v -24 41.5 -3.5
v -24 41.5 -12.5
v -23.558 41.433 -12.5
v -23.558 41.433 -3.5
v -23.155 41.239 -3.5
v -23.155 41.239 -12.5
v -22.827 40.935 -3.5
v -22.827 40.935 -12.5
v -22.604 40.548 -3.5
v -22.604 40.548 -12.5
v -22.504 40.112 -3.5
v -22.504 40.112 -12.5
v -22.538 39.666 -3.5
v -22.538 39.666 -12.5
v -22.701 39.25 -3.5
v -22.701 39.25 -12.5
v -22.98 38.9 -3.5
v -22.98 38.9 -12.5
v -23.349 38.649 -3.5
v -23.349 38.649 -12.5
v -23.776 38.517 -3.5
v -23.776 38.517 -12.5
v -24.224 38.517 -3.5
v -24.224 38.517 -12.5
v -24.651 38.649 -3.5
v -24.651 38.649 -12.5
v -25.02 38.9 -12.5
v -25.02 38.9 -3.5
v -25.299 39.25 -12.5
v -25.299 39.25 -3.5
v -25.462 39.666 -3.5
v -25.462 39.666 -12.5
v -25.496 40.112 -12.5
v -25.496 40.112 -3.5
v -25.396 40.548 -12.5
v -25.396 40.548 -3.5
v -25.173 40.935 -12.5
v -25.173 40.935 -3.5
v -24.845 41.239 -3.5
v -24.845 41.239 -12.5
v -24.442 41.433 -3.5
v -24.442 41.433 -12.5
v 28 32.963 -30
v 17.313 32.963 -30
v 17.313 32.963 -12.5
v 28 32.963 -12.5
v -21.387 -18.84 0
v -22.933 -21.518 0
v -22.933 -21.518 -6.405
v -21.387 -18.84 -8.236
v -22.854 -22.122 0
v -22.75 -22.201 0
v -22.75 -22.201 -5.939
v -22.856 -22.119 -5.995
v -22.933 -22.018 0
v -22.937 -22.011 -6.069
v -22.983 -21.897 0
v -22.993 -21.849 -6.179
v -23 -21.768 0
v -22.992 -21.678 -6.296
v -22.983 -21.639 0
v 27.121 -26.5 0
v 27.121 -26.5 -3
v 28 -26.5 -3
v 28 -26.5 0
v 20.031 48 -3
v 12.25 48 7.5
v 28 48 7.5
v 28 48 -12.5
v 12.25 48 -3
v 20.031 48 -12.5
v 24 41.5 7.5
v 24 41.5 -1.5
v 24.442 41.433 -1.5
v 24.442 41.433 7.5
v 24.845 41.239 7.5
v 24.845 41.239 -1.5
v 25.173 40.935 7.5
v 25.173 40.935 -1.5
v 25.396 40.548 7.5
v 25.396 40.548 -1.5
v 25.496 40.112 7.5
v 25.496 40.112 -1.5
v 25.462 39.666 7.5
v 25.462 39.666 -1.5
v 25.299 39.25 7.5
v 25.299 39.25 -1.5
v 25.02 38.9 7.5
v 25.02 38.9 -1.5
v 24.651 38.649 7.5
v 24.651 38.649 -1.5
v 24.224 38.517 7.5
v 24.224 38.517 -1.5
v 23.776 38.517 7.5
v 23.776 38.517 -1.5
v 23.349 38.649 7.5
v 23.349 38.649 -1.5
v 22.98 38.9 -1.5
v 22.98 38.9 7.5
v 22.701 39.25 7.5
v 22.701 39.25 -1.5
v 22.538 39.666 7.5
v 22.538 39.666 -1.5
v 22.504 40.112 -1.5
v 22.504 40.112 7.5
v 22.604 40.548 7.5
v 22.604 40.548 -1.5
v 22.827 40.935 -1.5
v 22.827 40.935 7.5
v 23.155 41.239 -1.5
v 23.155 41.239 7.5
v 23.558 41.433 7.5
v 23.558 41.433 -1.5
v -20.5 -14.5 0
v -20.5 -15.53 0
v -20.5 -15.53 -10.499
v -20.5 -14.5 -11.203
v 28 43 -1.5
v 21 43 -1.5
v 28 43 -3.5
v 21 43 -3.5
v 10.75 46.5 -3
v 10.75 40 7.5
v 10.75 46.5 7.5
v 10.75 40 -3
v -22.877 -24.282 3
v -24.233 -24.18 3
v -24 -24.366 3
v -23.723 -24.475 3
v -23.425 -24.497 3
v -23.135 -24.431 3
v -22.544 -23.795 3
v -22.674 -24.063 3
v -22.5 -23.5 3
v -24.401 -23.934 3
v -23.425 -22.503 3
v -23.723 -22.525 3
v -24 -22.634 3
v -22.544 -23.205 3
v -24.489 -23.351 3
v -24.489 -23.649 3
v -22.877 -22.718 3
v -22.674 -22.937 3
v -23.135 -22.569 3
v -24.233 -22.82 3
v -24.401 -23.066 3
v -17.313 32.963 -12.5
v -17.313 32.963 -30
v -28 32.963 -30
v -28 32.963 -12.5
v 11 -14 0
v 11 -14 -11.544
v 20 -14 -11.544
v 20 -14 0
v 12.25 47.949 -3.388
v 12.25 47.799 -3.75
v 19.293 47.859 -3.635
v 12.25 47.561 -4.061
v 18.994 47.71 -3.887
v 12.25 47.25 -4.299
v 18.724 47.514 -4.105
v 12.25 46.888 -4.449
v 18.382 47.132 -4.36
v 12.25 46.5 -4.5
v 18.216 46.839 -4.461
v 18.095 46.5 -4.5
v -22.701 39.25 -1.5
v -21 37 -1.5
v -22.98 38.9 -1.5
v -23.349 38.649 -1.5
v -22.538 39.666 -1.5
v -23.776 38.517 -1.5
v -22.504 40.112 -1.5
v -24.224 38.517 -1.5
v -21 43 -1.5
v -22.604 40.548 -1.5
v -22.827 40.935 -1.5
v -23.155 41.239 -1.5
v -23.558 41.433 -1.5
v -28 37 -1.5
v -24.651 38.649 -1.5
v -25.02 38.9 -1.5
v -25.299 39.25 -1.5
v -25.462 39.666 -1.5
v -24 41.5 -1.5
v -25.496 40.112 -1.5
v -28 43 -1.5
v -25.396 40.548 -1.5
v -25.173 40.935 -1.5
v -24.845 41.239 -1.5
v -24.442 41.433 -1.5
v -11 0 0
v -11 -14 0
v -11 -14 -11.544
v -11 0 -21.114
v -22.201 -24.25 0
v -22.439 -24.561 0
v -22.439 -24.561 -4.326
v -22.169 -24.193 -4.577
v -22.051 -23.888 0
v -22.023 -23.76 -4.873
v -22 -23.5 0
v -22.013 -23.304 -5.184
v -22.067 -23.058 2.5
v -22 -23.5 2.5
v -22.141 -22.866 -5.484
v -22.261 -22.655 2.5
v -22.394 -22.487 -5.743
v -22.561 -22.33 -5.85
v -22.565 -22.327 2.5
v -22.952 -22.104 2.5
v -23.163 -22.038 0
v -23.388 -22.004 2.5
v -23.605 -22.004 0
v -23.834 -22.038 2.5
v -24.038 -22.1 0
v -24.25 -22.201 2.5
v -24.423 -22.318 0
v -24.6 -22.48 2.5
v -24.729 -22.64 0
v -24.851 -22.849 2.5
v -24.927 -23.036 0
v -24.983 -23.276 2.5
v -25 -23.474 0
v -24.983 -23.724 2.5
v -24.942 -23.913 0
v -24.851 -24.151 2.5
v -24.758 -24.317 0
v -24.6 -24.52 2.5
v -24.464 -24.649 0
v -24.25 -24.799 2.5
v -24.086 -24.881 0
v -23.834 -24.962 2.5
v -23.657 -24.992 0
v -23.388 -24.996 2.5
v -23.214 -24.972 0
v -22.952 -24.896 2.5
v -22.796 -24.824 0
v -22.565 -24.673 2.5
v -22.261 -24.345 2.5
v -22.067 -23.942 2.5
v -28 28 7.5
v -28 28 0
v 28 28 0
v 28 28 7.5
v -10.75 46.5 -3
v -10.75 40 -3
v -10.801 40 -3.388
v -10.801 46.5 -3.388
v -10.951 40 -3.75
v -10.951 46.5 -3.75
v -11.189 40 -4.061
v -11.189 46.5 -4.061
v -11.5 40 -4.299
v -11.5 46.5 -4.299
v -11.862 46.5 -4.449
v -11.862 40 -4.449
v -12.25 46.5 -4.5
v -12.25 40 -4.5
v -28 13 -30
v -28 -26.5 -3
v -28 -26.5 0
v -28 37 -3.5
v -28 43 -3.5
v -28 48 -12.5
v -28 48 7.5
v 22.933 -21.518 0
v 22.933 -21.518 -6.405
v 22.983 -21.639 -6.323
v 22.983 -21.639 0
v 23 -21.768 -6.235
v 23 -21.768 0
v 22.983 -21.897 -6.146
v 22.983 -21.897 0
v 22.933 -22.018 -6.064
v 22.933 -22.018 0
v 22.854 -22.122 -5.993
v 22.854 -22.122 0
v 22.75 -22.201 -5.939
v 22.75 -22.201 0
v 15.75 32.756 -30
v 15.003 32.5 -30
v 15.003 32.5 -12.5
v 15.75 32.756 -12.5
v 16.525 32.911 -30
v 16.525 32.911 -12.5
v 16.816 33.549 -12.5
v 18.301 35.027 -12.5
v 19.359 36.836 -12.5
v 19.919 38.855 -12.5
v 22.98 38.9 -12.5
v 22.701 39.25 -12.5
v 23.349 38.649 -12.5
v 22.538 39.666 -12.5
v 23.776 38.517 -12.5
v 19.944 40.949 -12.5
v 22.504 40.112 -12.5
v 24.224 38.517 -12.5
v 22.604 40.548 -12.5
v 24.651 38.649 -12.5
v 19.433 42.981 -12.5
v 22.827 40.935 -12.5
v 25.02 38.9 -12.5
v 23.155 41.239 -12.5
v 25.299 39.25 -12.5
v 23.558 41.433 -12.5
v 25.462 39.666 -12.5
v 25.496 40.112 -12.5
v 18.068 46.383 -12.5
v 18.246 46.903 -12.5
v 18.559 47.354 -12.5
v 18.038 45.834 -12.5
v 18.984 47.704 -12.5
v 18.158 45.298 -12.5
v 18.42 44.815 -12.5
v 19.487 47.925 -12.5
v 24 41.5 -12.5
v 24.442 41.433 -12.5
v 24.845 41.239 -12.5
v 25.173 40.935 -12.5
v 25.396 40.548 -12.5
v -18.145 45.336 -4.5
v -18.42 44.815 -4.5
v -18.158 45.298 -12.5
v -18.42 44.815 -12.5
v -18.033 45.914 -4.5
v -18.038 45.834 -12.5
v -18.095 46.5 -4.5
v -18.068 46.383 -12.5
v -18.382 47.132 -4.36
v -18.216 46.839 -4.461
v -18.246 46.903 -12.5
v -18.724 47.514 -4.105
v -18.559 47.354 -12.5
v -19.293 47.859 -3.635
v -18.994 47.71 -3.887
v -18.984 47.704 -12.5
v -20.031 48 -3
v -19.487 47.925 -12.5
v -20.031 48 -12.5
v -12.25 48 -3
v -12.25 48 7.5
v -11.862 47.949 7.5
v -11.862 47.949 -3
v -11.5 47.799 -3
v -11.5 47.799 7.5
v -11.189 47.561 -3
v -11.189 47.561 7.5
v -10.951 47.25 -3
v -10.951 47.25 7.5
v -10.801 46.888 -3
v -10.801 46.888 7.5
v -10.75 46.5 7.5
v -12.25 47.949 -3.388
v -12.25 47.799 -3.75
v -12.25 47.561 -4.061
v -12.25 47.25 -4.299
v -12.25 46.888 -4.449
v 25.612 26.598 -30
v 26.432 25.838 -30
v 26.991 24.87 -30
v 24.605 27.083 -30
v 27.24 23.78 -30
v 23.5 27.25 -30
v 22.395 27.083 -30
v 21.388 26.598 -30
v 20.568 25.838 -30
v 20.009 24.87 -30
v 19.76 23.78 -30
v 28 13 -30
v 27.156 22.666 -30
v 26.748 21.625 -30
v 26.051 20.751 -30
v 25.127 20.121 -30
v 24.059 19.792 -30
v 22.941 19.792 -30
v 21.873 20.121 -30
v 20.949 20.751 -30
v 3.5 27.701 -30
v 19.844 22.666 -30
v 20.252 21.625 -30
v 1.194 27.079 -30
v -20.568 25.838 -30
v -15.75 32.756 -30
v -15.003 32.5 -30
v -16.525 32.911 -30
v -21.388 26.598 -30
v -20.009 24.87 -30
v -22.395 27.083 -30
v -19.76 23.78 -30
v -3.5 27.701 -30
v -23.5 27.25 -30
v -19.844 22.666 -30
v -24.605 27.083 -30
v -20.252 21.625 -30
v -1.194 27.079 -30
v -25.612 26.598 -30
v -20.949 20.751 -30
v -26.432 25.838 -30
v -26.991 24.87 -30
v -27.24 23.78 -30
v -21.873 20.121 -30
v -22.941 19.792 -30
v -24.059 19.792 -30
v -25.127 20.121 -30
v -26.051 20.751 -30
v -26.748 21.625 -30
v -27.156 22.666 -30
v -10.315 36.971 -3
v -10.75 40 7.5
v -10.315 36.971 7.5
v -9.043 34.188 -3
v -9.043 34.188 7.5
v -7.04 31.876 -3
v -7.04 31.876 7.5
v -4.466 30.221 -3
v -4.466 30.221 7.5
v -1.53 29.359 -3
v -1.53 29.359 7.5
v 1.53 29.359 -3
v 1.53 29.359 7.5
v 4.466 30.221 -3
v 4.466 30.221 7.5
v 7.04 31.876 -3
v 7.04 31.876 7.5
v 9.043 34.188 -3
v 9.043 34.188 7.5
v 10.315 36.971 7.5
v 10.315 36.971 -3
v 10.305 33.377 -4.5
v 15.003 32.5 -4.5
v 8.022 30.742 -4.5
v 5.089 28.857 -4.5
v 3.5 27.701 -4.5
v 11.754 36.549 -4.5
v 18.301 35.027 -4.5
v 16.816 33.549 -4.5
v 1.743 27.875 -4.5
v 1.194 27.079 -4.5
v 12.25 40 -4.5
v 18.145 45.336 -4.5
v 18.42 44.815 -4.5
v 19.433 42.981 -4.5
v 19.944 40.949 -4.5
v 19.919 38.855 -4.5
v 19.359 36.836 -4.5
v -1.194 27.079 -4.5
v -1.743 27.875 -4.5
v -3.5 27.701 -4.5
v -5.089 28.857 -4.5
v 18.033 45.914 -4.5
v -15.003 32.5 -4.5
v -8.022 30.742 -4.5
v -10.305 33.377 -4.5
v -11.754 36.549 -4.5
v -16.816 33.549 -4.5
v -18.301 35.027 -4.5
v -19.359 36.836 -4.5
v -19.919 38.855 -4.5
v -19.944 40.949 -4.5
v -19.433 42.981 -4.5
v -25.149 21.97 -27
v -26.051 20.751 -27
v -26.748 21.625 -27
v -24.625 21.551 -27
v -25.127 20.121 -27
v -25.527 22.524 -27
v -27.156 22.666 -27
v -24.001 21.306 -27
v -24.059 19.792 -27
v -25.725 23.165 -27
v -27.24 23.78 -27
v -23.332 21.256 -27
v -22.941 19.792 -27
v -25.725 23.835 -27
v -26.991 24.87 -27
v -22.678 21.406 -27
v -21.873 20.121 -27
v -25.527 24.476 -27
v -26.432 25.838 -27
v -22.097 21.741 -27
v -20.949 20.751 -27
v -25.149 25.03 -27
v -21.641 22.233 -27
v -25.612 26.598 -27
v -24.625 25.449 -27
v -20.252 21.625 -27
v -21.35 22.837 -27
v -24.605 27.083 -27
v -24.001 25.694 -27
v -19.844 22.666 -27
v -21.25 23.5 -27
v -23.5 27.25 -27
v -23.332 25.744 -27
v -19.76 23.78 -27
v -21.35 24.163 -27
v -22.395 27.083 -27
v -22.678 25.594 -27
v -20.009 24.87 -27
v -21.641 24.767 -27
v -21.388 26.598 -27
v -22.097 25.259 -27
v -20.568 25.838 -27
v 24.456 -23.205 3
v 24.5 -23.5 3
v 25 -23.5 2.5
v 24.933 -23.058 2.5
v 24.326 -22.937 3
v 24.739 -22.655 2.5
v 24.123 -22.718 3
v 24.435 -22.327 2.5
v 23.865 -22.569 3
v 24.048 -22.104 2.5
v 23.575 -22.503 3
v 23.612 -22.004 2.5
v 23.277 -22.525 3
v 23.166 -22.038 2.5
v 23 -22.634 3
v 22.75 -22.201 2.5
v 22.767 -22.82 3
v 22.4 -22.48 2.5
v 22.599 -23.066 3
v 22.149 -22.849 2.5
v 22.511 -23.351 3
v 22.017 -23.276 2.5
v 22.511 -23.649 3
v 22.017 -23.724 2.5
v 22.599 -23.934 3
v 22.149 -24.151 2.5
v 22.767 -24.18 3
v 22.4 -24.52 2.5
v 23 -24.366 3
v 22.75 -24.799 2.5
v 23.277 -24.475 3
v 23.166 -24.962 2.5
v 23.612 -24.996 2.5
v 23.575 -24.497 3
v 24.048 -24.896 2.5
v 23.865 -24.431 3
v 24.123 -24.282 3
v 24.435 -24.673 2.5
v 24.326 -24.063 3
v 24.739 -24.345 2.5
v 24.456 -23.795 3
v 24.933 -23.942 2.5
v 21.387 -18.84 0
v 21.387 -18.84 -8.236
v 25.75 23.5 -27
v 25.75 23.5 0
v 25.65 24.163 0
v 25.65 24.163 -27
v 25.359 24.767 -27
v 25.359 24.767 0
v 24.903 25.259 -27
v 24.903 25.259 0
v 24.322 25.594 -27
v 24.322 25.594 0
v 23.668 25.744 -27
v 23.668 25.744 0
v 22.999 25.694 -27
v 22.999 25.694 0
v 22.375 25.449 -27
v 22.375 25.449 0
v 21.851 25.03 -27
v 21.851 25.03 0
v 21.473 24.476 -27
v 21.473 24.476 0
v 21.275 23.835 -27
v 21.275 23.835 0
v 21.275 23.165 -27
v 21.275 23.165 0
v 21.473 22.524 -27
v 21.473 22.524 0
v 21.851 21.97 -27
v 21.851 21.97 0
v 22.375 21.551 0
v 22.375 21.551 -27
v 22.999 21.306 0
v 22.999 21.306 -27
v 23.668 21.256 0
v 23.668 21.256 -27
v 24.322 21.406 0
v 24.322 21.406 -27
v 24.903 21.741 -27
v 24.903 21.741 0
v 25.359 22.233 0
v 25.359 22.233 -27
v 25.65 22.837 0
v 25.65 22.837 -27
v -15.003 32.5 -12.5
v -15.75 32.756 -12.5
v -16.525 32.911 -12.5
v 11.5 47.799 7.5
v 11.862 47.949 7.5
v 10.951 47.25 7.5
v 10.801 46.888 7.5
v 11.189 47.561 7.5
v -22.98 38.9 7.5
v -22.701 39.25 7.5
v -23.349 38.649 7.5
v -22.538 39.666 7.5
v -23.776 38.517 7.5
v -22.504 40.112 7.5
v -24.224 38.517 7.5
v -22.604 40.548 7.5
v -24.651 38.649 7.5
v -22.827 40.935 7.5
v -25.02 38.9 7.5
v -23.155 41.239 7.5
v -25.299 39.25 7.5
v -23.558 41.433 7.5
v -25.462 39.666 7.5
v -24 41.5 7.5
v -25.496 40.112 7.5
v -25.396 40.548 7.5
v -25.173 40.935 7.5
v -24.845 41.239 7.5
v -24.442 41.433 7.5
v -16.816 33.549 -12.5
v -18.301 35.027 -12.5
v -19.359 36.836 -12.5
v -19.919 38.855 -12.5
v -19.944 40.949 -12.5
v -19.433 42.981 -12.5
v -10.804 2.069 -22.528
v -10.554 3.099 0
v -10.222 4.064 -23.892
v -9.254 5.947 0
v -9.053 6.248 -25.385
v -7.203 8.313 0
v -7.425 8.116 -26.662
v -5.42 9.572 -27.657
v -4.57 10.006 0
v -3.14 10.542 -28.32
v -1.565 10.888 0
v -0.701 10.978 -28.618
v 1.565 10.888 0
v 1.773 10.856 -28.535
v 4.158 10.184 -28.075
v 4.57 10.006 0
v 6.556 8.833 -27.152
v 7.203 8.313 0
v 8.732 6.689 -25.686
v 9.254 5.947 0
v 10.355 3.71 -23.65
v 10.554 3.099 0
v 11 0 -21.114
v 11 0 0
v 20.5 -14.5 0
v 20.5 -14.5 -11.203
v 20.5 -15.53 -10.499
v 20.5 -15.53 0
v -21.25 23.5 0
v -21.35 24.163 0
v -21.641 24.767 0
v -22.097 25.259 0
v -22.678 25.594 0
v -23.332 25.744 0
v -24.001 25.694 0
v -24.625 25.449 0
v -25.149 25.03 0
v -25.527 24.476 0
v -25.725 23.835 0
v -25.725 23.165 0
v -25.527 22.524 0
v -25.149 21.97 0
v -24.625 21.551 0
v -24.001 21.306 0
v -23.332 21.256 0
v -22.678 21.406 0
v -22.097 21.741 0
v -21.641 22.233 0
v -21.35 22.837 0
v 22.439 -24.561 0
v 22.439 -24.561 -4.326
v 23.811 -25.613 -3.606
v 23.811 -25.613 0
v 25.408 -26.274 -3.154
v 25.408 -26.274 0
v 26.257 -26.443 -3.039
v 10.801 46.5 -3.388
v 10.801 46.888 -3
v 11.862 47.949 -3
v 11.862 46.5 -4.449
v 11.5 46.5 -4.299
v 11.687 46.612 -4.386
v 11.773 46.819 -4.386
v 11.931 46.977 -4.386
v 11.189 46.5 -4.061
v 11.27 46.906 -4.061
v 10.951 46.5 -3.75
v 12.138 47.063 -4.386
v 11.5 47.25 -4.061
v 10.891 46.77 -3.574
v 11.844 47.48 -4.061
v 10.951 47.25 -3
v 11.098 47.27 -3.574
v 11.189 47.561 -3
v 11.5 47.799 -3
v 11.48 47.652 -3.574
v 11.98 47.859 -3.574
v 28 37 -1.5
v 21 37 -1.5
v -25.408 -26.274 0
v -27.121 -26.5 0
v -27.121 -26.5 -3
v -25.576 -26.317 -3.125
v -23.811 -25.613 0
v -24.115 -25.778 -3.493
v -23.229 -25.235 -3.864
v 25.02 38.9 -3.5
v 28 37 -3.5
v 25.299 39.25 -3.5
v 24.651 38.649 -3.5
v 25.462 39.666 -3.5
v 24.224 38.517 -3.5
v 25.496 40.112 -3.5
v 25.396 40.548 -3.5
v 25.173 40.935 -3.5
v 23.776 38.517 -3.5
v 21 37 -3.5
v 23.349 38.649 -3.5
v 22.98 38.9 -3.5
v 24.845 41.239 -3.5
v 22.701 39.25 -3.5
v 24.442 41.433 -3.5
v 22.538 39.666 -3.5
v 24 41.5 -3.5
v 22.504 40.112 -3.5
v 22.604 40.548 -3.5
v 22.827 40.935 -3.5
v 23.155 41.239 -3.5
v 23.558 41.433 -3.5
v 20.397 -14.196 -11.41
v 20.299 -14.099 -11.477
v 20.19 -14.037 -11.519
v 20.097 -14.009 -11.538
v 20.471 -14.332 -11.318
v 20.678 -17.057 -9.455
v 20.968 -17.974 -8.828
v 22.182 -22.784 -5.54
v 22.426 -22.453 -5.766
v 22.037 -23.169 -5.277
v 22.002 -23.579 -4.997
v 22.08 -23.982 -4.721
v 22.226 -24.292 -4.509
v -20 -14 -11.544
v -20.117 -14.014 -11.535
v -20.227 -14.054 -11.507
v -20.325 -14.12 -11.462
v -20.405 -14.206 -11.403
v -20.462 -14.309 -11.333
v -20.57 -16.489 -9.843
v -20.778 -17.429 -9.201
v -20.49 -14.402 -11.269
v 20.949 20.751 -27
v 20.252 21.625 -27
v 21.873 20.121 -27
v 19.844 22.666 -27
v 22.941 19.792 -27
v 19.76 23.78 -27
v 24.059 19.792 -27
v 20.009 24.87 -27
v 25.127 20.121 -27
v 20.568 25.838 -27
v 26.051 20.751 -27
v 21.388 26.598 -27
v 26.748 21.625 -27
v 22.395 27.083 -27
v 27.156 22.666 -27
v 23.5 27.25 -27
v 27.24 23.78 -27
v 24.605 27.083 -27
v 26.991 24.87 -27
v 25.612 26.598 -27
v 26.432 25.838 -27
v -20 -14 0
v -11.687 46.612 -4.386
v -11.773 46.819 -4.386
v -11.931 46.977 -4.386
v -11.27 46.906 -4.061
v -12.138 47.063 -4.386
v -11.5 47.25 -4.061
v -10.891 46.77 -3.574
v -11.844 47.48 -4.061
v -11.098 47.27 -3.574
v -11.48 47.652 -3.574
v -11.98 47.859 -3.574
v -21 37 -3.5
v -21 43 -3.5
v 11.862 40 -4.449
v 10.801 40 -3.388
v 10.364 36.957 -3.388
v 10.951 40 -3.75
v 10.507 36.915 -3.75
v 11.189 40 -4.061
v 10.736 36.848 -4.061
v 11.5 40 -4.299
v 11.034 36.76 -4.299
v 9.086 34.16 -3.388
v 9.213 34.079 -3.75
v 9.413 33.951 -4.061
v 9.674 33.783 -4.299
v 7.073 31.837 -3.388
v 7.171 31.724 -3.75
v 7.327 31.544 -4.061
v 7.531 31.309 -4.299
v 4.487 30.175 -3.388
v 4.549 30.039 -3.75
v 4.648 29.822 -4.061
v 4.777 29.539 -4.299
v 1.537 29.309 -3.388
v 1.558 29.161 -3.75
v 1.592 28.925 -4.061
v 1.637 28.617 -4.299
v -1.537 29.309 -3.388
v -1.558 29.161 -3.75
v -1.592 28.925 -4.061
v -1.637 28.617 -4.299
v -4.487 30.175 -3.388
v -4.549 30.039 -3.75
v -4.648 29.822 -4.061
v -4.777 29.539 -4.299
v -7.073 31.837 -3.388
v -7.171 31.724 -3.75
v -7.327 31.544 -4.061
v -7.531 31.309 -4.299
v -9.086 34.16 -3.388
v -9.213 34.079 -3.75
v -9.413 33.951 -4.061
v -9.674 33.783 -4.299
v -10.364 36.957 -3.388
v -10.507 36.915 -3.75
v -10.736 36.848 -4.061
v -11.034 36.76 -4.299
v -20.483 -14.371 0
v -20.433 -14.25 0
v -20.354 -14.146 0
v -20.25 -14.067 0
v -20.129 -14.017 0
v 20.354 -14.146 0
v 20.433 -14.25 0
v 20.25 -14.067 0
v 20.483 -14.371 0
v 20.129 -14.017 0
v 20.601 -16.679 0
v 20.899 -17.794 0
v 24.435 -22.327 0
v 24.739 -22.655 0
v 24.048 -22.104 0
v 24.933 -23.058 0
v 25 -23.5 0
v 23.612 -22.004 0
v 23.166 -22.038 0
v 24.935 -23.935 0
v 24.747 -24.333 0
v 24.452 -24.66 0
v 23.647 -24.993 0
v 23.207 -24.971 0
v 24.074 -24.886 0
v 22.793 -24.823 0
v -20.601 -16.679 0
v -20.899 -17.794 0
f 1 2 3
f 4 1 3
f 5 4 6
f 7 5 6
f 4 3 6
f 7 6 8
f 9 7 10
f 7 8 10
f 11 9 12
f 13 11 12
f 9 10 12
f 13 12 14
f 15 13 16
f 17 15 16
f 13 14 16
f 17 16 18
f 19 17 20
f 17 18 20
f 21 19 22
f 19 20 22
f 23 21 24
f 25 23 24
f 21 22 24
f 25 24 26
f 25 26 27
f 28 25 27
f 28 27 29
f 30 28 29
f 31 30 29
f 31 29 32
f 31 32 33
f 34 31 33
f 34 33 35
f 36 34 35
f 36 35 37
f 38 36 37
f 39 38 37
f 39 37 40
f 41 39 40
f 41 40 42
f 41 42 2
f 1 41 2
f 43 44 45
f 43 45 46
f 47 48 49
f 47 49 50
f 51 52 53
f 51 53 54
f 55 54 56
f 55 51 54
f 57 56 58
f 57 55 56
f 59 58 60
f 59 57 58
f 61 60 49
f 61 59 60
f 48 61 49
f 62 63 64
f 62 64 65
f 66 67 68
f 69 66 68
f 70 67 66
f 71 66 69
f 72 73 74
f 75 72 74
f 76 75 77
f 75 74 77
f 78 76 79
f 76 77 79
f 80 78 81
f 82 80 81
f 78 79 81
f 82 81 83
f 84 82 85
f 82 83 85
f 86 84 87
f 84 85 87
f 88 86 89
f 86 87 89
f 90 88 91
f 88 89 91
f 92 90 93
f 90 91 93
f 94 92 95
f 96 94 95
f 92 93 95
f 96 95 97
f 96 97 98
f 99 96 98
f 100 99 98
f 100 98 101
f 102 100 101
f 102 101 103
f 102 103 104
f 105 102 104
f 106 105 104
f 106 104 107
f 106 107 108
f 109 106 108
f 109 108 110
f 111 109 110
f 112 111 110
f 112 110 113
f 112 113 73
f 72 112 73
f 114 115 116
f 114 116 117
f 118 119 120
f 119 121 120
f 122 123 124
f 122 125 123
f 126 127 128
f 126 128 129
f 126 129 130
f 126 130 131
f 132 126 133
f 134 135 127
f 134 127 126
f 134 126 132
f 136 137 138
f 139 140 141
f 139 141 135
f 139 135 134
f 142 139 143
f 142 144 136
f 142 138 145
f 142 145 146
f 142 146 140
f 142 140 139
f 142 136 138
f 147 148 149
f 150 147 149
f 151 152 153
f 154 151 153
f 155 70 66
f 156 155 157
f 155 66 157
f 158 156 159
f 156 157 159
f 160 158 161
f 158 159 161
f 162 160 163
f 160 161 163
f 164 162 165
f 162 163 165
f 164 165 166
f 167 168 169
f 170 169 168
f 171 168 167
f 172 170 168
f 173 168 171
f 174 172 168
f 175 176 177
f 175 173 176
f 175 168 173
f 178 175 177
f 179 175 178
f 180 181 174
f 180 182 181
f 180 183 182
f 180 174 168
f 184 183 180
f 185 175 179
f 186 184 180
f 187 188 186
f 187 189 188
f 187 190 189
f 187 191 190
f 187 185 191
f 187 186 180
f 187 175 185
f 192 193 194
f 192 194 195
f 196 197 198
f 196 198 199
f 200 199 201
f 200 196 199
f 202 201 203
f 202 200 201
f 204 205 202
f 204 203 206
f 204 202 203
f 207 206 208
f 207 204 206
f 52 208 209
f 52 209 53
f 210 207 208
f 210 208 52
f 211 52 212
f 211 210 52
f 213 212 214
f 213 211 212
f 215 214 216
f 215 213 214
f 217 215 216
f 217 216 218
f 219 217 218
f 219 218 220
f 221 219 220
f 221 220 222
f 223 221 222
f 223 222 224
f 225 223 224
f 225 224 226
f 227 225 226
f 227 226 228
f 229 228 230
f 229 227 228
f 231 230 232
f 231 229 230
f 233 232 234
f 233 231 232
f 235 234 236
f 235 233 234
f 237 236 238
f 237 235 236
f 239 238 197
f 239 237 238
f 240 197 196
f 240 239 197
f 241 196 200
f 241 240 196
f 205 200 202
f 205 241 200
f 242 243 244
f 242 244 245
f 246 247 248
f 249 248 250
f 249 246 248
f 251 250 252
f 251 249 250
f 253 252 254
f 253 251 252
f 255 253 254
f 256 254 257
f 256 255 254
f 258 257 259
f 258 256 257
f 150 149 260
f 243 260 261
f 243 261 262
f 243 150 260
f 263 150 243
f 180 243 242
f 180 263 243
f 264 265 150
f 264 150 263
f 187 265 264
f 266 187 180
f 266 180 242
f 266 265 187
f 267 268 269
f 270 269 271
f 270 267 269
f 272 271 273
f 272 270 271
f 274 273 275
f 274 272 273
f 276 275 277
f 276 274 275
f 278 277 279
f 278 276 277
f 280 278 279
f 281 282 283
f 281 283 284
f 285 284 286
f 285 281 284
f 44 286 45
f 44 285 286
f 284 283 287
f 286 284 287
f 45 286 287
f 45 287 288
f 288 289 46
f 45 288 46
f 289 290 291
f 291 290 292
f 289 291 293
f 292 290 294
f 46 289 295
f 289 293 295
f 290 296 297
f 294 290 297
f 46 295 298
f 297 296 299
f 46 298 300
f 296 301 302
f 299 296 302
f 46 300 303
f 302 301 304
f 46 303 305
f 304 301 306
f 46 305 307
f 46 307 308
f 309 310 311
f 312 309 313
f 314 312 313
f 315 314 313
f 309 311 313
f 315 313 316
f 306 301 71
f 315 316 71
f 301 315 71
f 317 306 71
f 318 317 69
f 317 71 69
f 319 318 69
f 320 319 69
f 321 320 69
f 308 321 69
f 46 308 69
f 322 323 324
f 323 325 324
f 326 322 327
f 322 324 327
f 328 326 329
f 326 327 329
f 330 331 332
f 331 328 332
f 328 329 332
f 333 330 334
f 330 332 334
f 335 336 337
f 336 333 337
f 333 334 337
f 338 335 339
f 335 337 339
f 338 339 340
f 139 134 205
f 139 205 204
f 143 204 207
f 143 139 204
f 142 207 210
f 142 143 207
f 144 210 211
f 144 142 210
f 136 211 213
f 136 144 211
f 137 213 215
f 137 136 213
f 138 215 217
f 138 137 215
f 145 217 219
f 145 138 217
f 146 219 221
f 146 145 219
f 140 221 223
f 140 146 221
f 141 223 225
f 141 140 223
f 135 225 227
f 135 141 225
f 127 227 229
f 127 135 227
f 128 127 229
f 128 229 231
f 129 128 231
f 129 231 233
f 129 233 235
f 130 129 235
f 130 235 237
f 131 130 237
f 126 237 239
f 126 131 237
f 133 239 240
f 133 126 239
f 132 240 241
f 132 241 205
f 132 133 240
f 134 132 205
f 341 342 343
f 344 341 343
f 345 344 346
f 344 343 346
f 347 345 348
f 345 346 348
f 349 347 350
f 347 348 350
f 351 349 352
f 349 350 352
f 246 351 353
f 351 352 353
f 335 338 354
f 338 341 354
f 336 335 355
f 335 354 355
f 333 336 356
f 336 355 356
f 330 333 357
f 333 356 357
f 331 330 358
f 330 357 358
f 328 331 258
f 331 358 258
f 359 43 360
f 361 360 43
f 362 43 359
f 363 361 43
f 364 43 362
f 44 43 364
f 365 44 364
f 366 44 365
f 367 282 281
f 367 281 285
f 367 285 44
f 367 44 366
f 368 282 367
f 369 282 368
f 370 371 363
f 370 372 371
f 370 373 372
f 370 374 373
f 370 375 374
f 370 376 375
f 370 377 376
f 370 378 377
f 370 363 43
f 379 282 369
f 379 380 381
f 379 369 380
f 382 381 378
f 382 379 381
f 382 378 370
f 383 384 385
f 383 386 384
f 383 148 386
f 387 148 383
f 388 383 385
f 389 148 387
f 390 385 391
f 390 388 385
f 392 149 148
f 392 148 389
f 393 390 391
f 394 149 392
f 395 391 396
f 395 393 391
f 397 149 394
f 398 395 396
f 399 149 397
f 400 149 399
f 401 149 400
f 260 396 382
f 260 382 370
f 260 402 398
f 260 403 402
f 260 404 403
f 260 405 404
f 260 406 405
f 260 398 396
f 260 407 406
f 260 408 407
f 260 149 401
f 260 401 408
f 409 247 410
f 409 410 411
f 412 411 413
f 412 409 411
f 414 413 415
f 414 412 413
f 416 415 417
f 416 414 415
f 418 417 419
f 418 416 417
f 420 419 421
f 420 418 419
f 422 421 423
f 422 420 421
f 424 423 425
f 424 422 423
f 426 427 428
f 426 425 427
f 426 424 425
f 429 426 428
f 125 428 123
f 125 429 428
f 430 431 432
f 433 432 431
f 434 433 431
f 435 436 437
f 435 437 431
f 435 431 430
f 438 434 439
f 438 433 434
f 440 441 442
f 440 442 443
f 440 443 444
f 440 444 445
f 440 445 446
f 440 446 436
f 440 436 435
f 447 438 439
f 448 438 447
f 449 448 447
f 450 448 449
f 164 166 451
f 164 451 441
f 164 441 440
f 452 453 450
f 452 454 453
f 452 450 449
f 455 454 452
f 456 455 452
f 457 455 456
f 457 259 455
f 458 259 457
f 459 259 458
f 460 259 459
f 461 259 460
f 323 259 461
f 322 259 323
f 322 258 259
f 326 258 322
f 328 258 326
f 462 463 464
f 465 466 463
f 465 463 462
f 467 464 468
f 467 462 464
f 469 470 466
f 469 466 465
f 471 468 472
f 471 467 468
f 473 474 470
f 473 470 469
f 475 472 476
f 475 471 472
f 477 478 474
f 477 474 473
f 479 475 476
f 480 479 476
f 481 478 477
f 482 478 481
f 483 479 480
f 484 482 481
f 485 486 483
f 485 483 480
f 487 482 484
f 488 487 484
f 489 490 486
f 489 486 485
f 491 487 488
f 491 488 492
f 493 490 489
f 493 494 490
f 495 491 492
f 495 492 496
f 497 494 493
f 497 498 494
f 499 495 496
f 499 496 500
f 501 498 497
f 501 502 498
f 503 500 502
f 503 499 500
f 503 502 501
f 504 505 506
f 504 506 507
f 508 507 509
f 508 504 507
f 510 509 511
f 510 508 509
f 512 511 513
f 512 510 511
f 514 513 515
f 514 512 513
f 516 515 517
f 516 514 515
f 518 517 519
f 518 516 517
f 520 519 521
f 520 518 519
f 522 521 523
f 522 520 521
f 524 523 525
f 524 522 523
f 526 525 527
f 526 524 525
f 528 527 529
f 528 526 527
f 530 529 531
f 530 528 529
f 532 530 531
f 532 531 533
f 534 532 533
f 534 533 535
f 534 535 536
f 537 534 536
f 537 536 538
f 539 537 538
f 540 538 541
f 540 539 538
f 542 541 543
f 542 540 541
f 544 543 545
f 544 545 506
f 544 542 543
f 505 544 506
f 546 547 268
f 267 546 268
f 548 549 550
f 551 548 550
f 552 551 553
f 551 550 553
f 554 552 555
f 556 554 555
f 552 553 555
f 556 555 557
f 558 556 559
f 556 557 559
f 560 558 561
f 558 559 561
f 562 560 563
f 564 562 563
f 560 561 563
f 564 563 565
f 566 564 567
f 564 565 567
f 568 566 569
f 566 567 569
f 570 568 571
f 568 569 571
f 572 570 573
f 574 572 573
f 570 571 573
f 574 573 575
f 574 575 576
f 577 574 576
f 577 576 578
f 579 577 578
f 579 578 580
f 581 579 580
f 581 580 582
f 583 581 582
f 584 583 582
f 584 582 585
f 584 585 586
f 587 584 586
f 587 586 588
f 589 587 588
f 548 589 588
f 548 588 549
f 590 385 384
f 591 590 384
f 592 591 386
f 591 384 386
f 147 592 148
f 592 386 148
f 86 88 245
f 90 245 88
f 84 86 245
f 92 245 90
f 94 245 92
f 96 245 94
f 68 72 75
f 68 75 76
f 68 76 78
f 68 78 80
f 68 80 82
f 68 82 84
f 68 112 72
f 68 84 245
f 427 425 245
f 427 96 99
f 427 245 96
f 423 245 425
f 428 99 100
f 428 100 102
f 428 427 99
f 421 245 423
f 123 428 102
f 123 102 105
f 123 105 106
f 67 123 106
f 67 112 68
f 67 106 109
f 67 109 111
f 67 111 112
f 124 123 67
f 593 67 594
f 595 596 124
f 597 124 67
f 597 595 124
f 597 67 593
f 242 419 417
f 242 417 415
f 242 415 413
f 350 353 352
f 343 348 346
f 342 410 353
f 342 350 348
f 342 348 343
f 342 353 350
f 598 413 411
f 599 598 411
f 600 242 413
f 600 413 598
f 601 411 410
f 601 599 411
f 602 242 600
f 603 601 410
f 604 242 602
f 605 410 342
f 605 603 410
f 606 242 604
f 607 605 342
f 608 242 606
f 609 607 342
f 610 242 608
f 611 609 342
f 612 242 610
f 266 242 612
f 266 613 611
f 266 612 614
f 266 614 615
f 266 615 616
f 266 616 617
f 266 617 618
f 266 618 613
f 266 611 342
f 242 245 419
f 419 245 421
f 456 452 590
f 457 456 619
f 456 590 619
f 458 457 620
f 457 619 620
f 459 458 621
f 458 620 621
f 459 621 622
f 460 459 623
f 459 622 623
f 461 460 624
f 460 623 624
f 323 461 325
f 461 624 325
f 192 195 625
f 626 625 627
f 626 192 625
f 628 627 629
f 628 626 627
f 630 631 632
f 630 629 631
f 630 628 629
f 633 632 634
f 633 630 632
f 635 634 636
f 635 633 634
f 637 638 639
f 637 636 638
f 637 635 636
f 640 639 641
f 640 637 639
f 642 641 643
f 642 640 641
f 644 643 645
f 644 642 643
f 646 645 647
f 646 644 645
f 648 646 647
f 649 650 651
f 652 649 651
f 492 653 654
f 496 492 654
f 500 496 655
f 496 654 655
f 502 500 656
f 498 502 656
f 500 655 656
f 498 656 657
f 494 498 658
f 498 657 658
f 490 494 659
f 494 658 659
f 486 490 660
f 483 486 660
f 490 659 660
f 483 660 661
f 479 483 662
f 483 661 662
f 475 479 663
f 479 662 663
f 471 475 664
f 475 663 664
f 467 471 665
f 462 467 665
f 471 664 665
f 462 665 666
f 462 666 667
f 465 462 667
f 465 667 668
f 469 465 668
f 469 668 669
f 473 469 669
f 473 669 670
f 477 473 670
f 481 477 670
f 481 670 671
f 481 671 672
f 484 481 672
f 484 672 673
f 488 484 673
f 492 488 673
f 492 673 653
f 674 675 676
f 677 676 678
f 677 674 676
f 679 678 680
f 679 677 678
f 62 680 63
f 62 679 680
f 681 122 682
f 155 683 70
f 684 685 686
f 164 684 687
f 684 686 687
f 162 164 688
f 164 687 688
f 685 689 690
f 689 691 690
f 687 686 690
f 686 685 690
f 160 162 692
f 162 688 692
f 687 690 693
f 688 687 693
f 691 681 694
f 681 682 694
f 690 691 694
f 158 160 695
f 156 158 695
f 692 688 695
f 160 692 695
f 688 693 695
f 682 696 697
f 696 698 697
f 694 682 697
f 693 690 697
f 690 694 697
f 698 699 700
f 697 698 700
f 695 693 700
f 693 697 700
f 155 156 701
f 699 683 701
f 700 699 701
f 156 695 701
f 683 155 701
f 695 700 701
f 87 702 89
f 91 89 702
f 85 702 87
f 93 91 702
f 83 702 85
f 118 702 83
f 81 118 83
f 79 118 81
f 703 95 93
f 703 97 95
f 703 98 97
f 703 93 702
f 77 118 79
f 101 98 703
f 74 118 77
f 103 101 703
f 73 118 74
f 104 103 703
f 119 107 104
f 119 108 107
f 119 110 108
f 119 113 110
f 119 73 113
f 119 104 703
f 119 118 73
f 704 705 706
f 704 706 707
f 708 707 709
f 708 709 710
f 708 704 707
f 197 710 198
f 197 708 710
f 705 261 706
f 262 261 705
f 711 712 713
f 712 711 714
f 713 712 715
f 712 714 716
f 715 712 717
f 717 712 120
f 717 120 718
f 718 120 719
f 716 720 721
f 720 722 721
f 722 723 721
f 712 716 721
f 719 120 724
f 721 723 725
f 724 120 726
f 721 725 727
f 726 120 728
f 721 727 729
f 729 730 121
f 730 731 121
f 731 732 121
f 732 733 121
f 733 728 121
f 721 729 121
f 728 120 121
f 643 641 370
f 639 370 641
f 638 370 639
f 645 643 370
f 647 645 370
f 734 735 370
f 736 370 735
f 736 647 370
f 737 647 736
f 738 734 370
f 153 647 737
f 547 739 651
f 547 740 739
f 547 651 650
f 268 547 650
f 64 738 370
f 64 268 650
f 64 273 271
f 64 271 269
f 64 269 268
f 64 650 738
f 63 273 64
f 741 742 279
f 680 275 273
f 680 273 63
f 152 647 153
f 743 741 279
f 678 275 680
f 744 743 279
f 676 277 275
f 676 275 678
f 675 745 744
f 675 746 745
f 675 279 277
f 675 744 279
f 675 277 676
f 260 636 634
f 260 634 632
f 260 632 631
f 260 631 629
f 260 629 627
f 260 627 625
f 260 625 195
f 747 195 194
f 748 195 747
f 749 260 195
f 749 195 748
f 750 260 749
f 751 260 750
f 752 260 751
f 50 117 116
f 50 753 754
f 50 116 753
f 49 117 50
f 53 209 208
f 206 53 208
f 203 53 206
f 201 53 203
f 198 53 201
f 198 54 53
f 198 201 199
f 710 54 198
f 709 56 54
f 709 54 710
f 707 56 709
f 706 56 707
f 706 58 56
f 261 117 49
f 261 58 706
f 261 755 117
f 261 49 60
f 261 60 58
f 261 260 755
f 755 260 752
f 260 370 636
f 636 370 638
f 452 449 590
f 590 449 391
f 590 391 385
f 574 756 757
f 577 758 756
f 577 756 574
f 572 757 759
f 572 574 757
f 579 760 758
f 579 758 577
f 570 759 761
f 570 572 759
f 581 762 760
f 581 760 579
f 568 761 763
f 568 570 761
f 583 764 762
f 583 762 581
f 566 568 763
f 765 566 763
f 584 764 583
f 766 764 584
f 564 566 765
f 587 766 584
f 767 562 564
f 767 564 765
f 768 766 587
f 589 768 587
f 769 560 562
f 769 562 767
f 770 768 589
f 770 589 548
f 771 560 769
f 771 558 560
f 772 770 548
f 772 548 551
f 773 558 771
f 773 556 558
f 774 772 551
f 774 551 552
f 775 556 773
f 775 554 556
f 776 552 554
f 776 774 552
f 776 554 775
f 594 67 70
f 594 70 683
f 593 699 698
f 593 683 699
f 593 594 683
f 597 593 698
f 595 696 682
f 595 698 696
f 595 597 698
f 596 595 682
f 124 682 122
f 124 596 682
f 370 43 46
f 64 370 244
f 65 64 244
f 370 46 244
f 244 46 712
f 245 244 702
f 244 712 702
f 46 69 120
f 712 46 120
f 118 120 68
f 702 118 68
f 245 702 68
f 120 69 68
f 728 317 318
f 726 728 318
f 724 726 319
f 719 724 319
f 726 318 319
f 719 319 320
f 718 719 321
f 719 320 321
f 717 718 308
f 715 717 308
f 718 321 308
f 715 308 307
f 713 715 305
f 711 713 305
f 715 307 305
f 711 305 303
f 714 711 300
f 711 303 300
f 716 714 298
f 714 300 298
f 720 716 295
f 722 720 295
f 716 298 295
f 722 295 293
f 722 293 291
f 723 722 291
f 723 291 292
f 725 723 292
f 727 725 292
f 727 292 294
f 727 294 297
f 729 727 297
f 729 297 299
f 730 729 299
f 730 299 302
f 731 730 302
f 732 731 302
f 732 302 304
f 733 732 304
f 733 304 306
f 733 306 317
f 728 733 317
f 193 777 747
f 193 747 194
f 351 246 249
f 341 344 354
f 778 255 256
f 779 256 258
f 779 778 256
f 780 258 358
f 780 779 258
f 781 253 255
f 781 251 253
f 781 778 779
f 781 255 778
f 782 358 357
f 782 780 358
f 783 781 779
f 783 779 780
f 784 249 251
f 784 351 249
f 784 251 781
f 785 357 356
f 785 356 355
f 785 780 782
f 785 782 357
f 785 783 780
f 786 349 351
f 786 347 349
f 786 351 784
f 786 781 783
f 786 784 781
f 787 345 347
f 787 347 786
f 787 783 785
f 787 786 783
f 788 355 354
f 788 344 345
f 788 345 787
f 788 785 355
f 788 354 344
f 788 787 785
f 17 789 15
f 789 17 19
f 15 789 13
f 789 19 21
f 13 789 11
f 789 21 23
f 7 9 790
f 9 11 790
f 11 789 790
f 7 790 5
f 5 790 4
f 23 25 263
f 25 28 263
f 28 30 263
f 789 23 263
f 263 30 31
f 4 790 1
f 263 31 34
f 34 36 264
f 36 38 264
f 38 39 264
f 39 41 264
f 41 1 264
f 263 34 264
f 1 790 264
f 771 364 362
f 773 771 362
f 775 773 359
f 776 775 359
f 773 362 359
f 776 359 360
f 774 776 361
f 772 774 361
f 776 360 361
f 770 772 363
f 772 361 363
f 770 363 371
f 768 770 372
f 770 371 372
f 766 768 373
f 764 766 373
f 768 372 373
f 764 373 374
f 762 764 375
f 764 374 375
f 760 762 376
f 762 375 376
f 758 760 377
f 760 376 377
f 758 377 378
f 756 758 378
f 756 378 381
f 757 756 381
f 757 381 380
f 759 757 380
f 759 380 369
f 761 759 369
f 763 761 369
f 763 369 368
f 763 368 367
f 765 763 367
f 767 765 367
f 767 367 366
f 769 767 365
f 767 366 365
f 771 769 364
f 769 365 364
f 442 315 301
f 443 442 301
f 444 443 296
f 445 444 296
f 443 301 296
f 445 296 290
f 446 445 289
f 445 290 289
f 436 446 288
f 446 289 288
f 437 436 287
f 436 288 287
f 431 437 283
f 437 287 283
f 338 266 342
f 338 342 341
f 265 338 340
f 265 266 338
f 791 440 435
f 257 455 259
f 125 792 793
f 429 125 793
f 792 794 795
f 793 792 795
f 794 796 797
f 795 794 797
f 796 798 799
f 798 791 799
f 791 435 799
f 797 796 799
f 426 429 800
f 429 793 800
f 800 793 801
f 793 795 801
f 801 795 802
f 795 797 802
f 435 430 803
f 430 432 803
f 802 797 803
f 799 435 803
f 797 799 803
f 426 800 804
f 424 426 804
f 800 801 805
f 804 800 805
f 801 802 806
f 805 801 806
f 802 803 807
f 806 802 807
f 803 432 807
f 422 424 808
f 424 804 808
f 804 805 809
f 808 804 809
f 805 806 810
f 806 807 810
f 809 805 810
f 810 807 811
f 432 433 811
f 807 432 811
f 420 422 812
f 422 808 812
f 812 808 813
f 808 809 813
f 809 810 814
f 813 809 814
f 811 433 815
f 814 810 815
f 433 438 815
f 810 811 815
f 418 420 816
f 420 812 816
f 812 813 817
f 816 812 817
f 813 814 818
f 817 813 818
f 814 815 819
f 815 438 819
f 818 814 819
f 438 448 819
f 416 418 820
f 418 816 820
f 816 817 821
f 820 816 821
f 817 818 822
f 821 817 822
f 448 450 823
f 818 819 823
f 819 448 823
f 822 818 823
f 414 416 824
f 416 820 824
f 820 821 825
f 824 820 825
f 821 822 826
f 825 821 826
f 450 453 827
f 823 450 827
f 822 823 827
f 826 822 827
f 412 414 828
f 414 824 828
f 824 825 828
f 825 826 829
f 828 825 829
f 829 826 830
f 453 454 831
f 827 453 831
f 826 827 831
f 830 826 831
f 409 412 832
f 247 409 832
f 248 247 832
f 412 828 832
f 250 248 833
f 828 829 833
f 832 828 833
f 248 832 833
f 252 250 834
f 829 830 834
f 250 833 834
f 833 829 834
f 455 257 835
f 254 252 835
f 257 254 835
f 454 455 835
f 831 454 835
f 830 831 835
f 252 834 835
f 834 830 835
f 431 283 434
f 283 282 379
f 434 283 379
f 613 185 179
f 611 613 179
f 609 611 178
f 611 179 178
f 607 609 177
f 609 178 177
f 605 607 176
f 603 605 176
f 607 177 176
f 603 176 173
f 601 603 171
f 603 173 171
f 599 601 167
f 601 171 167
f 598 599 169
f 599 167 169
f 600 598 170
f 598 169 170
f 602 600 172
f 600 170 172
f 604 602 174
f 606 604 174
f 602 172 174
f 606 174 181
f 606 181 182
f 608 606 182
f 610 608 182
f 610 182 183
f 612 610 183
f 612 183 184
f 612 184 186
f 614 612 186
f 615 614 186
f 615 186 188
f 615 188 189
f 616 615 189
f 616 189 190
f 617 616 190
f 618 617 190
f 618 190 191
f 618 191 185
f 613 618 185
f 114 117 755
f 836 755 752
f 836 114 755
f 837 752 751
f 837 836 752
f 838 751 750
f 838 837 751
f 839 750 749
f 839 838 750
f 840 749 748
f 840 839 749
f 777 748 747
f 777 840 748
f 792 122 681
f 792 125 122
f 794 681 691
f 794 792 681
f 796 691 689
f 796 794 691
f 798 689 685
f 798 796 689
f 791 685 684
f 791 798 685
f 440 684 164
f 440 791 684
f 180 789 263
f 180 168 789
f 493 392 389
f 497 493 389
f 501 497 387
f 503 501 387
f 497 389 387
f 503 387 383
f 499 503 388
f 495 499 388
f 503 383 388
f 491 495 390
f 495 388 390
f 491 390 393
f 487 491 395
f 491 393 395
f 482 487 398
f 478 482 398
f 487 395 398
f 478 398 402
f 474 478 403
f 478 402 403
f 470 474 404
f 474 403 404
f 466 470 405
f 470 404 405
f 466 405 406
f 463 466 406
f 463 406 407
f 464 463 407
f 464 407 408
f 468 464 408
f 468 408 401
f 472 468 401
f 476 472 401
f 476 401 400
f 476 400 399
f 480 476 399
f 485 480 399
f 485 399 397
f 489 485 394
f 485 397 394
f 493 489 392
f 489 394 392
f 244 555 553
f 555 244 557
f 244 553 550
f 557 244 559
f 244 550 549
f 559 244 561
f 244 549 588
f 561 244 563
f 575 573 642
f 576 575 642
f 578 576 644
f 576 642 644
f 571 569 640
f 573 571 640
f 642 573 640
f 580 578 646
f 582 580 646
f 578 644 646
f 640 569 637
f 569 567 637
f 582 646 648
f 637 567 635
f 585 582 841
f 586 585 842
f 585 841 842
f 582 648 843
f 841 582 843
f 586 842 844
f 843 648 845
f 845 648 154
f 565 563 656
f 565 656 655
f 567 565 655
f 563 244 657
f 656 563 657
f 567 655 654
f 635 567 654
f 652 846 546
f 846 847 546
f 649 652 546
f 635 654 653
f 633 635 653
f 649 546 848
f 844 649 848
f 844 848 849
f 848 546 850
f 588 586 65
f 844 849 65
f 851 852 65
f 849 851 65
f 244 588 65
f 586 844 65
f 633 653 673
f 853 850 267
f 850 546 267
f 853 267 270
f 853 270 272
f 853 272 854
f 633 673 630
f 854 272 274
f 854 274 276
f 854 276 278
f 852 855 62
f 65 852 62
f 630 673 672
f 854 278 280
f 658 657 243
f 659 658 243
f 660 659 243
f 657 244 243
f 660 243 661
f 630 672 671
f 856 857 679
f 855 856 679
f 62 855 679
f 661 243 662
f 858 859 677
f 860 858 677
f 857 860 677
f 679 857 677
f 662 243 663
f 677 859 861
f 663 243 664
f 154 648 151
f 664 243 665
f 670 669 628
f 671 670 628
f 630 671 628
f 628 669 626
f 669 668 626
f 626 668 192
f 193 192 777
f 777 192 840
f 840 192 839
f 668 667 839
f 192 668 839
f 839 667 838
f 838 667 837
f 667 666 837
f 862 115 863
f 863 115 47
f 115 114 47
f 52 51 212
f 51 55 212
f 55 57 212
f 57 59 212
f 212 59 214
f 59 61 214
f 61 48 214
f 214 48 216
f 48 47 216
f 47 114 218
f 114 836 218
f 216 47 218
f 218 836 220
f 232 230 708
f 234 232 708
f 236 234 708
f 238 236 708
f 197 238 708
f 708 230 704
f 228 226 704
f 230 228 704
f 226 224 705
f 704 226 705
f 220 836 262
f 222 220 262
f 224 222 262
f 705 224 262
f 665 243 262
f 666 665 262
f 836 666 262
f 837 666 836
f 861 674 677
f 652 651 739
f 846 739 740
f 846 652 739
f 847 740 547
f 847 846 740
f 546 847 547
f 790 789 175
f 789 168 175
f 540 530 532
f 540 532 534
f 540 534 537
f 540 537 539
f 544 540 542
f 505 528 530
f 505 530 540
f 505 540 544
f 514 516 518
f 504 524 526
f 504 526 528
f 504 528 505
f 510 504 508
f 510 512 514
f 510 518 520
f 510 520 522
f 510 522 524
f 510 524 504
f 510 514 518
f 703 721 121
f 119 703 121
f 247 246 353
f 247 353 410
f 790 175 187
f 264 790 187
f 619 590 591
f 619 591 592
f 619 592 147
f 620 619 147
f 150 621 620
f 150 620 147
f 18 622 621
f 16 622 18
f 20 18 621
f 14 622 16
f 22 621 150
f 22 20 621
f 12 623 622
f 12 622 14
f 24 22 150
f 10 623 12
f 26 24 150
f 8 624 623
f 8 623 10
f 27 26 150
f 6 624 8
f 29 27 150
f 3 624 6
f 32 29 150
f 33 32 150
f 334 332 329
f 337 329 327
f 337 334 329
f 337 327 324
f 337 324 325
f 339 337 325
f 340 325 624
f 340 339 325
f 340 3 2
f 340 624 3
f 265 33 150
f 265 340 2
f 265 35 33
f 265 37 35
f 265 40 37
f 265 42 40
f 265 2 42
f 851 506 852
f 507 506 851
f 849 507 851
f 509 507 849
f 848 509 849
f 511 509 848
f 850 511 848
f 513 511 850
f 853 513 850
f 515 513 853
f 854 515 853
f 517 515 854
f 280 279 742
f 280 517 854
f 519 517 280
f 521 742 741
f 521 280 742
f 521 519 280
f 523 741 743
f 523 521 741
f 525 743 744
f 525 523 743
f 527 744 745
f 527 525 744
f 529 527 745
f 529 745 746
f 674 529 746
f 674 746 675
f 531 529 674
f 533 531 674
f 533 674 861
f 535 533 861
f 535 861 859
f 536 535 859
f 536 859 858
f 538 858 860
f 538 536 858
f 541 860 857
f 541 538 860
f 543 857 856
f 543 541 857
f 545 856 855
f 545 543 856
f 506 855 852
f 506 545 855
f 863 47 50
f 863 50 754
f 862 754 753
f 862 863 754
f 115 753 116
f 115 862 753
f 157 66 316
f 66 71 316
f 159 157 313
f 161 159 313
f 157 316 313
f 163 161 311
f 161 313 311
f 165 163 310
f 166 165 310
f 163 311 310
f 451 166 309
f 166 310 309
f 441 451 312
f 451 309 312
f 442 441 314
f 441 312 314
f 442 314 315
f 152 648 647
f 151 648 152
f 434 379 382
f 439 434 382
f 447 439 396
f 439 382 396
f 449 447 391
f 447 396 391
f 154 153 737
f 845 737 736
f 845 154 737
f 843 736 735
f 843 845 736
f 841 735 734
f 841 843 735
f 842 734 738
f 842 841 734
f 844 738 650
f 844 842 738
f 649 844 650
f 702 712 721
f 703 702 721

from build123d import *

# Parameters (mm, degrees)
BOSS_EXTRUDE1_DEPTH      = 28
BOSS_EXTRUDE1_DEPTH_BACK = 28
CUT_EXTRUDE1_REACH       = 65.151
BOSS_EXTRUDE2_START      = 3
SKETCH5_R                = 1.5000000000000009
BOSS_EXTRUDE2_DEPTH      = 3
CHAMFER1_SIZE            = 0.5
CUT_EXTRUDE2_REACH       = 65.151
SKETCH6_R                = 2.2499999999999987
SKETCH7_R                = 3.7499999999999996
CUT_EXTRUDE3_DEPTH       = 3
CUT_EXTRUDE4_REACH       = 69.039
CUT_EXTRUDE5_DEPTH       = 25.5
FILLET1_R                = 1.5
CUT_EXTRUDE6_DEPTH       = 17.5
CUT_EXTRUDE7_REACH       = 61.059
SKETCH11_R               = 1.5000000000000009
SKETCH11_R_2             = 1.4999999999999987
SKETCH12_W               = 6.9999999999999964
SKETCH12_H               = 5.999999999999993
CUT_EXTRUDE8_DEPTH       = 1


with BuildPart() as part:
    # Sketch3 → Boss-Extrude1 (new, two sides: drawn at the far end of the back side and taken through both)
    with BuildSketch(Plane(origin=(0, 0, 0), x_dir=(0, 0, -1), z_dir=(1, 0, 0)).offset(-BOSS_EXTRUDE1_DEPTH_BACK)):
        Polygon((0, -26.500000000000004), (0, 0), (0, 28.000000000000007), (-7.499999999999999, 28.000000000000007), (-7.5, 48), (29.999999999999996, 48.000000000000014), (30.000000000000004, 13.000000000000009), (3, -26.500000000000004), align=None)
    extrude(amount=BOSS_EXTRUDE1_DEPTH + BOSS_EXTRUDE1_DEPTH_BACK)

    # Cut-Extrude1: up to this plane
    cut_extrude1_end = Plane(origin=(27.999999999999993, 13.000000000000009, -30.000000000000004), z_dir=(0, 0.5643092286475101, 0.8255635011695056))
    # Sketch4 → Cut-Extrude1 (cut, up to the surface)
    with BuildSketch(Plane.XY, mode=Mode.PRIVATE) as cut_extrude1_sk1:
        with BuildLine():
            Line((-22.93301270189222, -21.517949192431118), (-21.387088719442275, -18.84033031018861))
            ThreePointArc((-21.387088719442275, -18.84033031018861), (-20.725616019582173, -17.24339394704681), (-20.5, -15.529670138408827))
            Line((-20.5, -15.529670138408827), (-20.5, -14.499999999999995))
            ThreePointArc((-20.5, -14.499999999999995), (-20.353553390593273, -14.146446609406722), (-20, -13.999999999999995))
            Line((-20, -13.999999999999995), (-10.999999999999998, -13.999999999999995))
            Line((-10.999999999999998, -13.999999999999995), (-11, -1.35e-15))
            ThreePointArc((-11, -1.35e-15), (-1.179e-14, 11), (10.999999999999993, 1.253e-14))
            Line((10.999999999999993, 1.253e-14), (10.999999999999991, -13.999999999999968))
            Line((10.999999999999991, -13.999999999999968), (20.000000000000007, -13.99999999999999))
            ThreePointArc((20.000000000000007, -13.99999999999999), (20.353553390593284, -14.146446609406715), (20.500000000000014, -14.499999999999991))
            Line((20.500000000000014, -14.499999999999991), (20.500000000000014, -15.529670138408822))
            ThreePointArc((20.500000000000014, -15.529670138408822), (20.725616019582187, -17.2433939470468), (21.38708871944229, -18.8403303101886))
            Line((21.38708871944229, -18.8403303101886), (22.933012701892235, -21.51794919243111))
            ThreePointArc((22.933012701892235, -21.51794919243111), (22.98296291314455, -21.897358714982374), (22.750000000000018, -22.200961894323335))
            ThreePointArc((22.750000000000018, -22.200961894323335), (22.012832707939275, -23.304210711669903), (22.43933982822019, -24.560660171779812))
            ThreePointArc((22.43933982822019, -24.560660171779812), (24.587450747697442, -25.99598200005571), (27.12132034355963, -26.499999999999993))
            Line((27.12132034355963, -26.499999999999993), (-27.12132034355962, -26.5))
            ThreePointArc((-27.12132034355962, -26.5), (-24.58745074769743, -25.99598200005572), (-22.43933982822018, -24.56066017177982))
            ThreePointArc((-22.43933982822018, -24.56066017177982), (-22.01283270793929, -23.30421071166992), (-22.750000000000004, -22.200961894323342))
            ThreePointArc((-22.750000000000004, -22.200961894323342), (-22.982962913144537, -21.89735871498238), (-22.93301270189222, -21.517949192431118))
        make_face()
    cut_extrude1_tool1 = split(extrude(cut_extrude1_sk1.sketch, amount=-CUT_EXTRUDE1_REACH, mode=Mode.PRIVATE), bisect_by=cut_extrude1_end, keep=Keep.BOTH, mode=Mode.PRIVATE)
    add(cut_extrude1_tool1.solids().sort_by_distance((0, -11.913251, 0))[0], mode=Mode.SUBTRACT)

    # Sketch5 → Boss-Extrude2 (add)
    with BuildSketch(Plane.XY.offset(BOSS_EXTRUDE2_START)):
        with Locations((23.499999999999996, -23.5)):
            Circle(SKETCH5_R)
        with Locations((-23.500000000000004, -23.5)):
            Circle(SKETCH5_R)
    extrude(amount=-BOSS_EXTRUDE2_DEPTH)

    # Chamfer1
    chamfer1_edges = [part.edges().sort_by_distance(p)[0] for p in [
        (21.999999999999996, -23.5, 3),
        (-25.000000000000004, -23.5, 3),
    ]]
    chamfer(chamfer1_edges, length=CHAMFER1_SIZE)

    # Sketch6 → Cut-Extrude2 (cut, up to next)
    with BuildSketch(Plane.XY, mode=Mode.PRIVATE) as cut_extrude2_sk1:
        with Locations((23.499999999999996, 23.5)):
            Circle(SKETCH6_R)
    cut_extrude2_tool1 = extrude(cut_extrude2_sk1.sketch, amount=-CUT_EXTRUDE2_REACH, mode=Mode.PRIVATE) & part.part
    # Sketch6 → Cut-Extrude2 (cut, up to next)
    with BuildSketch(Plane.XY, mode=Mode.PRIVATE) as cut_extrude2_sk2:
        with Locations((-23.500000000000004, 23.5)):
            Circle(SKETCH6_R)
    cut_extrude2_tool2 = extrude(cut_extrude2_sk2.sketch, amount=-CUT_EXTRUDE2_REACH, mode=Mode.PRIVATE) & part.part
    add(cut_extrude2_tool1.solids().sort_by_distance((23.5, 23.5, 0))[0], mode=Mode.SUBTRACT)
    add(cut_extrude2_tool2.solids().sort_by_distance((-23.5, 23.5, 0))[0], mode=Mode.SUBTRACT)

    # Sketch7 → Cut-Extrude3 (cut)
    with BuildSketch(Plane(origin=(0, 5.95e-15, -30.000000000000007), x_dir=(-1, 0, 0), z_dir=(0, 1.7e-16, -1))):
        with Locations(Location((-23.499999999999996, 23.5, 0), (0, 0, 90))):
            Circle(SKETCH7_R)
        with Locations(Location((23.500000000000004, 23.5, 0), (0, 0, 90))):
            Circle(SKETCH7_R)
    extrude(amount=-CUT_EXTRUDE3_DEPTH, mode=Mode.SUBTRACT)

    # Sketch8 → Cut-Extrude4 (cut, up to next)
    with BuildSketch(Plane(origin=(0, 5.95e-15, -30.000000000000007), x_dir=(-1, 0, 0), z_dir=(0, 2e-16, -1)), mode=Mode.PRIVATE) as cut_extrude4_sk1:
        with BuildLine():
            Line((-10.749999999999991, 40.000000000000014), (-10.749999999999993, 48.00000000000001))
            Line((-10.749999999999993, 48.00000000000001), (10.749999999999995, 48.00000000000001))
            Line((10.749999999999995, 48.00000000000001), (10.750000000000004, 40.000000000000014))
            ThreePointArc((10.750000000000004, 40.000000000000014), (4.96e-15, 29.250000000000014), (-10.749999999999991, 40.000000000000014))
        make_face()
    cut_extrude4_tool1 = extrude(cut_extrude4_sk1.sketch, amount=-CUT_EXTRUDE4_REACH, mode=Mode.PRIVATE) & part.part
    add(cut_extrude4_tool1.solids().sort_by_distance((0, 39.603429, -30))[0], mode=Mode.SUBTRACT)

    # Sketch9 → Cut-Extrude5 (cut)
    with BuildSketch(Plane(origin=(0, 5.95e-15, -30.000000000000007), x_dir=(-1, 0, 0), z_dir=(0, 2e-16, -1))):
        with BuildLine():
            Line((3.5000000000000053, 27.700862818523312), (15.002567384846198, 32.500000000000014))
            ThreePointArc((15.002567384846198, 32.500000000000014), (19.704089145058386, 37.826997771928276), (18.41995596409805, 44.815002787484154))
            ThreePointArc((18.41995596409805, 44.815002787484154), (18.246442865607545, 46.902775048106754), (20.03109891440682, 48.00000000000001))
            Line((20.03109891440682, 48.00000000000001), (-20.031098914406805, 48.000000000000014))
            ThreePointArc((-20.031098914406805, 48.000000000000014), (-18.24644286560753, 46.90277504810676), (-18.419955964098037, 44.81500278748416))
            ThreePointArc((-18.419955964098037, 44.81500278748416), (-19.70408914505838, 37.82699777192828), (-15.002567384846188, 32.500000000000014))
            Line((-15.002567384846188, 32.500000000000014), (-3.4999999999999947, 27.700862818523312))
            ThreePointArc((-3.4999999999999947, 27.700862818523312), (4.59e-15, 27.00000000000002), (3.5000000000000053, 27.700862818523312))
        make_face()
    extrude(amount=-CUT_EXTRUDE5_DEPTH, mode=Mode.SUBTRACT)

    # Fillet1
    fillet1_edges = [part.edges().sort_by_distance(p)[0] for p in [
        (10.749999999999993, 48.00000000000001, 1.5000000000000036),
        (-10.749999999999995, 48.00000000000001, 1.5000000000000036),
        (-10.75, 44.000000000000014, -4.499999999999998),
        (-15.390549457203406, 48.00000000000001, -4.499999999999997),
        (15.390549457203399, 48.000000000000014, -4.499999999999997),
        (-3.8e-15, 29.250000000000014, -4.500000000000002),
        (10.749999999999993, 44.000000000000014, -4.499999999999999),
    ]]
    fillet(fillet1_edges, radius=FILLET1_R)

    # Sketch10 → Cut-Extrude6 (cut)
    with BuildSketch(Plane(origin=(0, 5.95e-15, -30.000000000000007), x_dir=(-1, 0, 0), z_dir=(0, 2e-16, -1))):
        with BuildLine():
            Line((17.312884960931758, 32.96263305373123), (28.000000000000007, 32.962633053731224))
            Line((28.000000000000007, 32.962633053731224), (28.000000000000007, 48.00000000000001))
            Line((28.000000000000007, 48.00000000000001), (20.03109891440682, 48.00000000000001))
            ThreePointArc((20.03109891440682, 48.00000000000001), (18.24644286560754, 46.902775048106754), (18.41995596409805, 44.815002787484154))
            ThreePointArc((18.41995596409805, 44.815002787484154), (19.704089145058383, 37.826997771928276), (15.002567384846198, 32.500000000000014))
            ThreePointArc((15.002567384846198, 32.500000000000014), (16.1347936396864, 32.84583803391052), (17.312884960931758, 32.96263305373123))
        make_face()
        with BuildLine():
            Line((-17.312884960931758, 32.96263305373123), (-28.000000000000007, 32.962633053731224))
            Line((-28.000000000000007, 32.962633053731224), (-28.000000000000007, 48.00000000000001))
            Line((-28.000000000000007, 48.00000000000001), (-20.03109891440682, 48.00000000000001))
            ThreePointArc((-20.03109891440682, 48.00000000000001), (-18.24644286560754, 46.902775048106754), (-18.41995596409805, 44.815002787484154))
            ThreePointArc((-18.41995596409805, 44.815002787484154), (-19.704089145058383, 37.826997771928276), (-15.002567384846198, 32.500000000000014))
            ThreePointArc((-15.002567384846198, 32.500000000000014), (-16.1347936396864, 32.84583803391052), (-17.312884960931758, 32.96263305373123))
        make_face()
    extrude(amount=-CUT_EXTRUDE6_DEPTH, mode=Mode.SUBTRACT)

    # Sketch11 → Cut-Extrude7 (cut, up to next)
    with BuildSketch(Plane(origin=(0, 5.4e-16, -12.500000000000002), x_dir=(-1, 0, 0), z_dir=(0, 4e-17, -1)), mode=Mode.PRIVATE) as cut_extrude7_sk1:
        with Locations(Location((24.000000000000007, 40.00000000000002, 0), (0, 0, 90))):
            Circle(SKETCH11_R)
    cut_extrude7_tool1 = extrude(cut_extrude7_sk1.sketch, amount=-CUT_EXTRUDE7_REACH, mode=Mode.PRIVATE) & part.part
    # Sketch11 → Cut-Extrude7 (cut, up to next)
    with BuildSketch(Plane(origin=(0, 5.4e-16, -12.500000000000002), x_dir=(-1, 0, 0), z_dir=(0, 4e-17, -1)), mode=Mode.PRIVATE) as cut_extrude7_sk2:
        with Locations(Location((-24, 39.99999999999999, 0), (0, 0, 90))):
            Circle(SKETCH11_R_2)
    cut_extrude7_tool2 = extrude(cut_extrude7_sk2.sketch, amount=-CUT_EXTRUDE7_REACH, mode=Mode.PRIVATE) & part.part
    add(cut_extrude7_tool1.solids().sort_by_distance((-24, 40, -12.5))[0], mode=Mode.SUBTRACT)
    add(cut_extrude7_tool2.solids().sort_by_distance((24, 40, -12.5))[0], mode=Mode.SUBTRACT)

    # Sketch12 → Cut-Extrude8 (cut, symmetric)
    with BuildSketch(Plane(origin=(0, 1.1e-16, -2.5000000000000027), x_dir=(-1, 0, 0), z_dir=(0, 4e-17, -1))):
        with Locations((24.500000000000007, 40.00000000000003)):
            Rectangle(SKETCH12_W, SKETCH12_H)
        Polygon((-28.000000000000007, 43.000000000000014), (-28.000000000000007, 37.00000000000002), (-21.00000000000001, 37.00000000000003), (-21.00000000000001, 43.000000000000014), align=None)
    extrude(amount=CUT_EXTRUDE8_DEPTH, both=True, mode=Mode.SUBTRACT)


solid = part.part
